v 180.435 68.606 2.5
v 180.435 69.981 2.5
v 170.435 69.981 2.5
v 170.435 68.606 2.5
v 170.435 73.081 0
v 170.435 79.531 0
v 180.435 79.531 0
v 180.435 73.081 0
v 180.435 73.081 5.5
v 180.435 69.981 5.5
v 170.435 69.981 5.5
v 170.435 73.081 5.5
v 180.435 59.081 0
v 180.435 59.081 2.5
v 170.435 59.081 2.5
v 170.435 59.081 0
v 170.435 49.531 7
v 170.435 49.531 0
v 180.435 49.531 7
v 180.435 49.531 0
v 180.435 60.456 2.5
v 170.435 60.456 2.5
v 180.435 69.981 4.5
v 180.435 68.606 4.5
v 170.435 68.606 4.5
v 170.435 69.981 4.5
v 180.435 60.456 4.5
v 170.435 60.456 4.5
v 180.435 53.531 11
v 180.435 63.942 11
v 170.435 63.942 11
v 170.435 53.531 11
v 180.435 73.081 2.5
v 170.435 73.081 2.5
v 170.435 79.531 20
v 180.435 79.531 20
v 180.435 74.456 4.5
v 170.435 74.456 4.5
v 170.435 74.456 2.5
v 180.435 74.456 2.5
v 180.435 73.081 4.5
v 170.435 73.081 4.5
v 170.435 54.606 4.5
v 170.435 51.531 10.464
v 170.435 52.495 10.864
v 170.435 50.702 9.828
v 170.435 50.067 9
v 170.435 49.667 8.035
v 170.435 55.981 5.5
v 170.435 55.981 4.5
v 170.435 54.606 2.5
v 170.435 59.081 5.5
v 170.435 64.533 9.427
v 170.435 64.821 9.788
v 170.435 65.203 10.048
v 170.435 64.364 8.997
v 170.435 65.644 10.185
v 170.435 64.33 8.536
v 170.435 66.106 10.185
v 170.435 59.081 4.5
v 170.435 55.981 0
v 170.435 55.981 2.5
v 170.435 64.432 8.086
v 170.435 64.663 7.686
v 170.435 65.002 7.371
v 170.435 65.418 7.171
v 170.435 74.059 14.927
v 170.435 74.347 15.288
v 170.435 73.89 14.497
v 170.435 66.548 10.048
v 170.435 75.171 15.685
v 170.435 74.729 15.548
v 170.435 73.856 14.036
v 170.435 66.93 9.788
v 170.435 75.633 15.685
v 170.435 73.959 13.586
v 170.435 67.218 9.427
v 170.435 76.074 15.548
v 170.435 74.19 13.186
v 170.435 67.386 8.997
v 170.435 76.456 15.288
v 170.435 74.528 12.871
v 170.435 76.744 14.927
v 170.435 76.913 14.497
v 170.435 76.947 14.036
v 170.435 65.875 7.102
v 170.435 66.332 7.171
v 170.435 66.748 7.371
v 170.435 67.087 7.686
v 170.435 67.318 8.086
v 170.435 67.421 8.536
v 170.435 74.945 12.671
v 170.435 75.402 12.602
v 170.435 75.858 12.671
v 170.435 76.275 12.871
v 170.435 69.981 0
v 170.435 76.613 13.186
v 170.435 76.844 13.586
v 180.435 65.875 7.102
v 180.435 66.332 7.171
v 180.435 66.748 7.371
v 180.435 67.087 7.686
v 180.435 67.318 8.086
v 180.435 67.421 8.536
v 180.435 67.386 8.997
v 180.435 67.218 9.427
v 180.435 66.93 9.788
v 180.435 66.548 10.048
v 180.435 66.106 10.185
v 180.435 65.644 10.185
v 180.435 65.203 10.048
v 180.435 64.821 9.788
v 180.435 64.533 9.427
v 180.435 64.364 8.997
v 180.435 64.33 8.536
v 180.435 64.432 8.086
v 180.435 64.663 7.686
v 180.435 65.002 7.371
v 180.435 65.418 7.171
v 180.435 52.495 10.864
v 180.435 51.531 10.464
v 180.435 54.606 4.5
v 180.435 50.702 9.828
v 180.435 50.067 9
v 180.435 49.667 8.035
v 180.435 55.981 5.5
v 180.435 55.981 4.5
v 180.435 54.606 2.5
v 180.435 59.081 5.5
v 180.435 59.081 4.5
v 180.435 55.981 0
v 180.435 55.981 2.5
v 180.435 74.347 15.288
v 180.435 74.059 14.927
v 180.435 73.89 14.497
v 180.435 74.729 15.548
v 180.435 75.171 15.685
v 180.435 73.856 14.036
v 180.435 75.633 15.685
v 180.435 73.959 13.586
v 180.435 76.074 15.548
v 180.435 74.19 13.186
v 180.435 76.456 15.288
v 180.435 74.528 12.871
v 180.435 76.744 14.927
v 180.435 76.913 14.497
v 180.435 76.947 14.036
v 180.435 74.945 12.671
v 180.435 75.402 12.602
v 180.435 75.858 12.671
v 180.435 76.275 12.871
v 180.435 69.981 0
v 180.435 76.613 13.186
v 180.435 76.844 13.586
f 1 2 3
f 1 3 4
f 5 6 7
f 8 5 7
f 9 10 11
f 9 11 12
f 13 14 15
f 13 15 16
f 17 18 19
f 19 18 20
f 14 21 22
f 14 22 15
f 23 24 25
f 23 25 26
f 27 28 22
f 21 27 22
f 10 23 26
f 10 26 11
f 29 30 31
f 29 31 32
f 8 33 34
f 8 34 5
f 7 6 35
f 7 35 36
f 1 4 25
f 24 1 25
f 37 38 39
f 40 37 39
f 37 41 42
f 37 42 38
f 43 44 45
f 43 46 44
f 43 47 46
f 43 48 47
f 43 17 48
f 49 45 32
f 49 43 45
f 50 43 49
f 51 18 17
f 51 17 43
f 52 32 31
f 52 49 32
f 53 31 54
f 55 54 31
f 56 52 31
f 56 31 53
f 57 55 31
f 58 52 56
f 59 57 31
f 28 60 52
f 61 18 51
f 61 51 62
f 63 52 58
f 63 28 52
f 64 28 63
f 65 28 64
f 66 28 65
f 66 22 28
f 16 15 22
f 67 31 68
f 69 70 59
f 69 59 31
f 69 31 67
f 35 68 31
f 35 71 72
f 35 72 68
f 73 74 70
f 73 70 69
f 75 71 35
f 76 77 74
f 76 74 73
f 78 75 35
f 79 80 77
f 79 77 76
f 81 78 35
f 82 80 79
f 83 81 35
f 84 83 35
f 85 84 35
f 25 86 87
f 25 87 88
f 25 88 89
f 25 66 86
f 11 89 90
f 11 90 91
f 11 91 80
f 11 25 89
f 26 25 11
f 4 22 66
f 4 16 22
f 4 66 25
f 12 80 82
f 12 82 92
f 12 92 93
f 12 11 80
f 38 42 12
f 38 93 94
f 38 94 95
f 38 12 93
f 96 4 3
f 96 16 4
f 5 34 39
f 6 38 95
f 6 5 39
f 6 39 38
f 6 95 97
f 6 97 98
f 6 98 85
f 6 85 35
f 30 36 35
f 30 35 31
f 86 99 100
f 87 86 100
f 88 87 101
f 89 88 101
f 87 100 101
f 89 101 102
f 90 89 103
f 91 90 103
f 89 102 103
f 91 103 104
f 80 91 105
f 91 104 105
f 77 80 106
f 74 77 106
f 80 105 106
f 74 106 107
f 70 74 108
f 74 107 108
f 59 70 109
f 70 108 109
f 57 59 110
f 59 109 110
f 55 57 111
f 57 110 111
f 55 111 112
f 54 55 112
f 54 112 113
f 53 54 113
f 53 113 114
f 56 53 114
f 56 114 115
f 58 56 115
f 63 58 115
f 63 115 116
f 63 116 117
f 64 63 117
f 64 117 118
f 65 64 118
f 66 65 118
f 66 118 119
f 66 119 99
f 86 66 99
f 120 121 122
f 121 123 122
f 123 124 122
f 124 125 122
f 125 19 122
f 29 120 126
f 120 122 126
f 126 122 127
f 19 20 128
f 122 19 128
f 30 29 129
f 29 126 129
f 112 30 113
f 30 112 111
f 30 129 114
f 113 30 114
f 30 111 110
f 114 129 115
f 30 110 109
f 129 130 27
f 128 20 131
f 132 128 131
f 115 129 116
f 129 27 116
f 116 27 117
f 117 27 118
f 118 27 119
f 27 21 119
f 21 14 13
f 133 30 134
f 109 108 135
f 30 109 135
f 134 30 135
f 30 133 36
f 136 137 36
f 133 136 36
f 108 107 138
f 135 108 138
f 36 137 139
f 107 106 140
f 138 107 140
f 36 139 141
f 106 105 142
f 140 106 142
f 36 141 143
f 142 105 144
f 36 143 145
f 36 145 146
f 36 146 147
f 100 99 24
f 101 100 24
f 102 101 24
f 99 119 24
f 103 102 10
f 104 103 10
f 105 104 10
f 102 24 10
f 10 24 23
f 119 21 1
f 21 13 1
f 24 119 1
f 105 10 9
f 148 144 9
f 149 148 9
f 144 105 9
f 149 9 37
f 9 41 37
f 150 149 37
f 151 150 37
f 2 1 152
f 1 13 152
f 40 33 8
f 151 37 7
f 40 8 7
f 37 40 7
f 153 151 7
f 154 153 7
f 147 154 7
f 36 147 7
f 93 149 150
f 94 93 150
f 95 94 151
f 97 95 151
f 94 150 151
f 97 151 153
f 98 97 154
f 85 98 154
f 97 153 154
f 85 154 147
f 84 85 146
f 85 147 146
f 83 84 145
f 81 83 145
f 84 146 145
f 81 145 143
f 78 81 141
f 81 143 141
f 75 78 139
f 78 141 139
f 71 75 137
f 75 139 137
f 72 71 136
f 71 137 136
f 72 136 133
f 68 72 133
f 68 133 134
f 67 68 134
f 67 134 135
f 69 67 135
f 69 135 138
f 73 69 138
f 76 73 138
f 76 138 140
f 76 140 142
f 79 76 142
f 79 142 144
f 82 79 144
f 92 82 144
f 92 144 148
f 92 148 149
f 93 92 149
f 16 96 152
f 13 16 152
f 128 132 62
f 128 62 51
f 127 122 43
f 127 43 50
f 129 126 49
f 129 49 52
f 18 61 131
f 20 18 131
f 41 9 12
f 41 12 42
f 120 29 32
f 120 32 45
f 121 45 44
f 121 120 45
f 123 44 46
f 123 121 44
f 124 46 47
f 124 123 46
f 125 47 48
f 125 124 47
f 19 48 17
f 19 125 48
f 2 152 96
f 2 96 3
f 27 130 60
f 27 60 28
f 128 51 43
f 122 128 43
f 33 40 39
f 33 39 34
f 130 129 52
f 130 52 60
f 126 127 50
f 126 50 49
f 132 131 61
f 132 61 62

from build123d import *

# Parameters (mm, degrees)
SZKIC1_W                    = 10
SZKIC1_H                    = 30
DODANIE_WYCI_GNI_CIE1_DEPTH = 30
WYTNIJ_WYCI_GNI_CIE1_DEPTH  = 10
SZYK_LINIOWY1_COUNT         = 2
SZYK_LINIOWY1_PITCH         = 14
WYTNIJ_WYCI_GNI_CIE2_DEPTH  = 10
SZKIC7_R                    = 1.55
WYTNIJ_WYCI_GNI_CIE4_DEPTH  = 20
WYTNIJ_WYCI_GNI_CIE5_DEPTH  = 10


with BuildPart() as part:
    # Szkic1 → Dodanie-wyciągnięcie1 (new body)
    with BuildSketch(Plane.XY):
        with Locations((175.434880274, 64.530770571)):
            Rectangle(SZKIC1_W, SZKIC1_H)
    extrude(amount=DODANIE_WYCI_GNI_CIE1_DEPTH)

    # Szkic3 → Wytnij-wyciągnięcie1 (cut)
    with BuildSketch(Plane(origin=(180.434880274, 0, 0), x_dir=(0, 0, -1), z_dir=(1, 0, 0))):
        Polygon((0, 73.080770571), (0, 69.980770571), (-2.5, 69.980770571), (-2.5, 68.605770571), (-4.5, 68.605770571), (-4.5, 69.980770571), (-5.5, 69.980770571), (-5.5, 73.080770571), (-4.5, 73.080770571), (-4.5, 74.455770571), (-2.5, 74.455770571), (-2.5, 73.080770571), align=None)
    wytnij_wyci_gni_cie1 = extrude(amount=-WYTNIJ_WYCI_GNI_CIE1_DEPTH, mode=Mode.SUBTRACT)

    # Szyk liniowy1: Wytnij-wyciągnięcie1 ×2
    with Locations(*[(0, -i * SZYK_LINIOWY1_PITCH, 0) for i in range(1, SZYK_LINIOWY1_COUNT)]):
        add(wytnij_wyci_gni_cie1, mode=Mode.SUBTRACT)

    # Szkic4 → Wytnij-wyciągnięcie2 (cut)
    with BuildSketch(Plane(origin=(180.434880274, 0, 0), x_dir=(0, 0, -1), z_dir=(1, 0, 0))):
        Polygon((-20, 79.530770571), (-11, 63.942313303), (-11, 49.530770571), (-30, 49.530770571), (-30, 79.530770571), align=None)
    extrude(amount=-WYTNIJ_WYCI_GNI_CIE2_DEPTH, mode=Mode.SUBTRACT)

    # Szkic7 → Wytnij-wyciągnięcie4 (cut)
    with BuildSketch(Plane(origin=(180.434880274, 0, 0), x_dir=(0, 0, -1), z_dir=(1, 0, 0))):
        with Locations((-8.651923789, 65.875326005)):
            Circle(SZKIC7_R)
        with Locations((-14.151923789, 75.401605446)):
            Circle(SZKIC7_R)
    extrude(amount=-WYTNIJ_WYCI_GNI_CIE4_DEPTH, mode=Mode.SUBTRACT)

    # Szkic8 → Wytnij-wyciągnięcie5 (cut)
    with BuildSketch(Plane(origin=(180.434880274, 0, 0), x_dir=(0, 0, -1), z_dir=(1, 0, 0))):
        with BuildLine():
            Line((-7, 49.530770571), (-11, 49.530770571))
            Line((-11, 49.530770571), (-11, 53.530770571))
            ThreePointArc((-11, 53.530770571), (-9.828427125, 50.702343446), (-7, 49.530770571))
        make_face()
    extrude(amount=-WYTNIJ_WYCI_GNI_CIE5_DEPTH, mode=Mode.SUBTRACT)


solid = part.part
